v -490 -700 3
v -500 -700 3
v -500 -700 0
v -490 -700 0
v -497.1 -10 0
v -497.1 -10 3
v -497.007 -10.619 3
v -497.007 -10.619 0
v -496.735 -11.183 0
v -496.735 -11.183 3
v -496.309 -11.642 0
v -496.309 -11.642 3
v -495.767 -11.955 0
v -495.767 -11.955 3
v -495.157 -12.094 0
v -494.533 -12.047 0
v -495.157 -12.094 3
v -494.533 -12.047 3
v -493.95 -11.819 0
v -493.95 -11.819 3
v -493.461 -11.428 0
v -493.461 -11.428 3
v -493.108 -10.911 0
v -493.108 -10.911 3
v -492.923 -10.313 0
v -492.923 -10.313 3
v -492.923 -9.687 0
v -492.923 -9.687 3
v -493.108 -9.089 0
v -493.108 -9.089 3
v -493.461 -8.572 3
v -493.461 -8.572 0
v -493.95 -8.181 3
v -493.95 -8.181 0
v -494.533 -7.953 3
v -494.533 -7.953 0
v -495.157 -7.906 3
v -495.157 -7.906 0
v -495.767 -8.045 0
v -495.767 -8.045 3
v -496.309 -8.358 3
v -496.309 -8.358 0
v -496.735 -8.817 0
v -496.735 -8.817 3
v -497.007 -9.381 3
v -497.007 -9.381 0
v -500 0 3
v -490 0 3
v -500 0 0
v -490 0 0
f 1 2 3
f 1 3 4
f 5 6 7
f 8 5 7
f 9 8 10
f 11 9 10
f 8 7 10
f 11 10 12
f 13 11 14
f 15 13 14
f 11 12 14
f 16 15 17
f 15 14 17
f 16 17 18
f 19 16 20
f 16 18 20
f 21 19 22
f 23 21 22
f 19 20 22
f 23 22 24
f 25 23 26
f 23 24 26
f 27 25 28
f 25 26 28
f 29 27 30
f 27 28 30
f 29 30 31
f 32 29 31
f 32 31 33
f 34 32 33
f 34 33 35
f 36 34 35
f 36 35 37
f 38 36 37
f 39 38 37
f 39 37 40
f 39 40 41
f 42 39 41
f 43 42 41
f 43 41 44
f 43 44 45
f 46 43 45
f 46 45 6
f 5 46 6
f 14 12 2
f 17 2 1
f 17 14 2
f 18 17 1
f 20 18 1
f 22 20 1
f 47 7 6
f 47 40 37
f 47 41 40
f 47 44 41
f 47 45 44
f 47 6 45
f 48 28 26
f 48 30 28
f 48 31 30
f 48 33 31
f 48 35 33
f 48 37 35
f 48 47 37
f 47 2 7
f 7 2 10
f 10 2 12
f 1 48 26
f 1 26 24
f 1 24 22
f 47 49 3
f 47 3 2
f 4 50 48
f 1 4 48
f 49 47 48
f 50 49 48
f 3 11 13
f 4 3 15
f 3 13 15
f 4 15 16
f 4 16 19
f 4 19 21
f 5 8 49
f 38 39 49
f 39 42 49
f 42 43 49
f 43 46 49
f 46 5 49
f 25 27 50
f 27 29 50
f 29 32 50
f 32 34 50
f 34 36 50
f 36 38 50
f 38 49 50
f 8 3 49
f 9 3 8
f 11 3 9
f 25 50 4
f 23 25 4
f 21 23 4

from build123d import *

# Parameters (mm, degrees)
SKETCH_W    = 10
SKETCH_H    = 3
PAD_DEPTH   = 700
SKETCH001_R = 2.1
HOLE_DEPTH  = 3.001


with BuildPart() as part:
    # Sketch → Pad (new body)
    with BuildSketch(Plane.XZ):
        with Locations((-495, 1.5)):
            Rectangle(SKETCH_W, SKETCH_H)
    extrude(amount=PAD_DEPTH)

    # Sketch001 (on Face3 of Pad) → Hole (cut, through all)
    with BuildSketch(Plane(origin=(0, 0, 3), x_dir=(-1, 0, 0), z_dir=(0, 0, 1))):
        with Locations((495, 10)):
            Circle(SKETCH001_R)
    extrude(amount=-HOLE_DEPTH, mode=Mode.SUBTRACT)


solid = part.part
